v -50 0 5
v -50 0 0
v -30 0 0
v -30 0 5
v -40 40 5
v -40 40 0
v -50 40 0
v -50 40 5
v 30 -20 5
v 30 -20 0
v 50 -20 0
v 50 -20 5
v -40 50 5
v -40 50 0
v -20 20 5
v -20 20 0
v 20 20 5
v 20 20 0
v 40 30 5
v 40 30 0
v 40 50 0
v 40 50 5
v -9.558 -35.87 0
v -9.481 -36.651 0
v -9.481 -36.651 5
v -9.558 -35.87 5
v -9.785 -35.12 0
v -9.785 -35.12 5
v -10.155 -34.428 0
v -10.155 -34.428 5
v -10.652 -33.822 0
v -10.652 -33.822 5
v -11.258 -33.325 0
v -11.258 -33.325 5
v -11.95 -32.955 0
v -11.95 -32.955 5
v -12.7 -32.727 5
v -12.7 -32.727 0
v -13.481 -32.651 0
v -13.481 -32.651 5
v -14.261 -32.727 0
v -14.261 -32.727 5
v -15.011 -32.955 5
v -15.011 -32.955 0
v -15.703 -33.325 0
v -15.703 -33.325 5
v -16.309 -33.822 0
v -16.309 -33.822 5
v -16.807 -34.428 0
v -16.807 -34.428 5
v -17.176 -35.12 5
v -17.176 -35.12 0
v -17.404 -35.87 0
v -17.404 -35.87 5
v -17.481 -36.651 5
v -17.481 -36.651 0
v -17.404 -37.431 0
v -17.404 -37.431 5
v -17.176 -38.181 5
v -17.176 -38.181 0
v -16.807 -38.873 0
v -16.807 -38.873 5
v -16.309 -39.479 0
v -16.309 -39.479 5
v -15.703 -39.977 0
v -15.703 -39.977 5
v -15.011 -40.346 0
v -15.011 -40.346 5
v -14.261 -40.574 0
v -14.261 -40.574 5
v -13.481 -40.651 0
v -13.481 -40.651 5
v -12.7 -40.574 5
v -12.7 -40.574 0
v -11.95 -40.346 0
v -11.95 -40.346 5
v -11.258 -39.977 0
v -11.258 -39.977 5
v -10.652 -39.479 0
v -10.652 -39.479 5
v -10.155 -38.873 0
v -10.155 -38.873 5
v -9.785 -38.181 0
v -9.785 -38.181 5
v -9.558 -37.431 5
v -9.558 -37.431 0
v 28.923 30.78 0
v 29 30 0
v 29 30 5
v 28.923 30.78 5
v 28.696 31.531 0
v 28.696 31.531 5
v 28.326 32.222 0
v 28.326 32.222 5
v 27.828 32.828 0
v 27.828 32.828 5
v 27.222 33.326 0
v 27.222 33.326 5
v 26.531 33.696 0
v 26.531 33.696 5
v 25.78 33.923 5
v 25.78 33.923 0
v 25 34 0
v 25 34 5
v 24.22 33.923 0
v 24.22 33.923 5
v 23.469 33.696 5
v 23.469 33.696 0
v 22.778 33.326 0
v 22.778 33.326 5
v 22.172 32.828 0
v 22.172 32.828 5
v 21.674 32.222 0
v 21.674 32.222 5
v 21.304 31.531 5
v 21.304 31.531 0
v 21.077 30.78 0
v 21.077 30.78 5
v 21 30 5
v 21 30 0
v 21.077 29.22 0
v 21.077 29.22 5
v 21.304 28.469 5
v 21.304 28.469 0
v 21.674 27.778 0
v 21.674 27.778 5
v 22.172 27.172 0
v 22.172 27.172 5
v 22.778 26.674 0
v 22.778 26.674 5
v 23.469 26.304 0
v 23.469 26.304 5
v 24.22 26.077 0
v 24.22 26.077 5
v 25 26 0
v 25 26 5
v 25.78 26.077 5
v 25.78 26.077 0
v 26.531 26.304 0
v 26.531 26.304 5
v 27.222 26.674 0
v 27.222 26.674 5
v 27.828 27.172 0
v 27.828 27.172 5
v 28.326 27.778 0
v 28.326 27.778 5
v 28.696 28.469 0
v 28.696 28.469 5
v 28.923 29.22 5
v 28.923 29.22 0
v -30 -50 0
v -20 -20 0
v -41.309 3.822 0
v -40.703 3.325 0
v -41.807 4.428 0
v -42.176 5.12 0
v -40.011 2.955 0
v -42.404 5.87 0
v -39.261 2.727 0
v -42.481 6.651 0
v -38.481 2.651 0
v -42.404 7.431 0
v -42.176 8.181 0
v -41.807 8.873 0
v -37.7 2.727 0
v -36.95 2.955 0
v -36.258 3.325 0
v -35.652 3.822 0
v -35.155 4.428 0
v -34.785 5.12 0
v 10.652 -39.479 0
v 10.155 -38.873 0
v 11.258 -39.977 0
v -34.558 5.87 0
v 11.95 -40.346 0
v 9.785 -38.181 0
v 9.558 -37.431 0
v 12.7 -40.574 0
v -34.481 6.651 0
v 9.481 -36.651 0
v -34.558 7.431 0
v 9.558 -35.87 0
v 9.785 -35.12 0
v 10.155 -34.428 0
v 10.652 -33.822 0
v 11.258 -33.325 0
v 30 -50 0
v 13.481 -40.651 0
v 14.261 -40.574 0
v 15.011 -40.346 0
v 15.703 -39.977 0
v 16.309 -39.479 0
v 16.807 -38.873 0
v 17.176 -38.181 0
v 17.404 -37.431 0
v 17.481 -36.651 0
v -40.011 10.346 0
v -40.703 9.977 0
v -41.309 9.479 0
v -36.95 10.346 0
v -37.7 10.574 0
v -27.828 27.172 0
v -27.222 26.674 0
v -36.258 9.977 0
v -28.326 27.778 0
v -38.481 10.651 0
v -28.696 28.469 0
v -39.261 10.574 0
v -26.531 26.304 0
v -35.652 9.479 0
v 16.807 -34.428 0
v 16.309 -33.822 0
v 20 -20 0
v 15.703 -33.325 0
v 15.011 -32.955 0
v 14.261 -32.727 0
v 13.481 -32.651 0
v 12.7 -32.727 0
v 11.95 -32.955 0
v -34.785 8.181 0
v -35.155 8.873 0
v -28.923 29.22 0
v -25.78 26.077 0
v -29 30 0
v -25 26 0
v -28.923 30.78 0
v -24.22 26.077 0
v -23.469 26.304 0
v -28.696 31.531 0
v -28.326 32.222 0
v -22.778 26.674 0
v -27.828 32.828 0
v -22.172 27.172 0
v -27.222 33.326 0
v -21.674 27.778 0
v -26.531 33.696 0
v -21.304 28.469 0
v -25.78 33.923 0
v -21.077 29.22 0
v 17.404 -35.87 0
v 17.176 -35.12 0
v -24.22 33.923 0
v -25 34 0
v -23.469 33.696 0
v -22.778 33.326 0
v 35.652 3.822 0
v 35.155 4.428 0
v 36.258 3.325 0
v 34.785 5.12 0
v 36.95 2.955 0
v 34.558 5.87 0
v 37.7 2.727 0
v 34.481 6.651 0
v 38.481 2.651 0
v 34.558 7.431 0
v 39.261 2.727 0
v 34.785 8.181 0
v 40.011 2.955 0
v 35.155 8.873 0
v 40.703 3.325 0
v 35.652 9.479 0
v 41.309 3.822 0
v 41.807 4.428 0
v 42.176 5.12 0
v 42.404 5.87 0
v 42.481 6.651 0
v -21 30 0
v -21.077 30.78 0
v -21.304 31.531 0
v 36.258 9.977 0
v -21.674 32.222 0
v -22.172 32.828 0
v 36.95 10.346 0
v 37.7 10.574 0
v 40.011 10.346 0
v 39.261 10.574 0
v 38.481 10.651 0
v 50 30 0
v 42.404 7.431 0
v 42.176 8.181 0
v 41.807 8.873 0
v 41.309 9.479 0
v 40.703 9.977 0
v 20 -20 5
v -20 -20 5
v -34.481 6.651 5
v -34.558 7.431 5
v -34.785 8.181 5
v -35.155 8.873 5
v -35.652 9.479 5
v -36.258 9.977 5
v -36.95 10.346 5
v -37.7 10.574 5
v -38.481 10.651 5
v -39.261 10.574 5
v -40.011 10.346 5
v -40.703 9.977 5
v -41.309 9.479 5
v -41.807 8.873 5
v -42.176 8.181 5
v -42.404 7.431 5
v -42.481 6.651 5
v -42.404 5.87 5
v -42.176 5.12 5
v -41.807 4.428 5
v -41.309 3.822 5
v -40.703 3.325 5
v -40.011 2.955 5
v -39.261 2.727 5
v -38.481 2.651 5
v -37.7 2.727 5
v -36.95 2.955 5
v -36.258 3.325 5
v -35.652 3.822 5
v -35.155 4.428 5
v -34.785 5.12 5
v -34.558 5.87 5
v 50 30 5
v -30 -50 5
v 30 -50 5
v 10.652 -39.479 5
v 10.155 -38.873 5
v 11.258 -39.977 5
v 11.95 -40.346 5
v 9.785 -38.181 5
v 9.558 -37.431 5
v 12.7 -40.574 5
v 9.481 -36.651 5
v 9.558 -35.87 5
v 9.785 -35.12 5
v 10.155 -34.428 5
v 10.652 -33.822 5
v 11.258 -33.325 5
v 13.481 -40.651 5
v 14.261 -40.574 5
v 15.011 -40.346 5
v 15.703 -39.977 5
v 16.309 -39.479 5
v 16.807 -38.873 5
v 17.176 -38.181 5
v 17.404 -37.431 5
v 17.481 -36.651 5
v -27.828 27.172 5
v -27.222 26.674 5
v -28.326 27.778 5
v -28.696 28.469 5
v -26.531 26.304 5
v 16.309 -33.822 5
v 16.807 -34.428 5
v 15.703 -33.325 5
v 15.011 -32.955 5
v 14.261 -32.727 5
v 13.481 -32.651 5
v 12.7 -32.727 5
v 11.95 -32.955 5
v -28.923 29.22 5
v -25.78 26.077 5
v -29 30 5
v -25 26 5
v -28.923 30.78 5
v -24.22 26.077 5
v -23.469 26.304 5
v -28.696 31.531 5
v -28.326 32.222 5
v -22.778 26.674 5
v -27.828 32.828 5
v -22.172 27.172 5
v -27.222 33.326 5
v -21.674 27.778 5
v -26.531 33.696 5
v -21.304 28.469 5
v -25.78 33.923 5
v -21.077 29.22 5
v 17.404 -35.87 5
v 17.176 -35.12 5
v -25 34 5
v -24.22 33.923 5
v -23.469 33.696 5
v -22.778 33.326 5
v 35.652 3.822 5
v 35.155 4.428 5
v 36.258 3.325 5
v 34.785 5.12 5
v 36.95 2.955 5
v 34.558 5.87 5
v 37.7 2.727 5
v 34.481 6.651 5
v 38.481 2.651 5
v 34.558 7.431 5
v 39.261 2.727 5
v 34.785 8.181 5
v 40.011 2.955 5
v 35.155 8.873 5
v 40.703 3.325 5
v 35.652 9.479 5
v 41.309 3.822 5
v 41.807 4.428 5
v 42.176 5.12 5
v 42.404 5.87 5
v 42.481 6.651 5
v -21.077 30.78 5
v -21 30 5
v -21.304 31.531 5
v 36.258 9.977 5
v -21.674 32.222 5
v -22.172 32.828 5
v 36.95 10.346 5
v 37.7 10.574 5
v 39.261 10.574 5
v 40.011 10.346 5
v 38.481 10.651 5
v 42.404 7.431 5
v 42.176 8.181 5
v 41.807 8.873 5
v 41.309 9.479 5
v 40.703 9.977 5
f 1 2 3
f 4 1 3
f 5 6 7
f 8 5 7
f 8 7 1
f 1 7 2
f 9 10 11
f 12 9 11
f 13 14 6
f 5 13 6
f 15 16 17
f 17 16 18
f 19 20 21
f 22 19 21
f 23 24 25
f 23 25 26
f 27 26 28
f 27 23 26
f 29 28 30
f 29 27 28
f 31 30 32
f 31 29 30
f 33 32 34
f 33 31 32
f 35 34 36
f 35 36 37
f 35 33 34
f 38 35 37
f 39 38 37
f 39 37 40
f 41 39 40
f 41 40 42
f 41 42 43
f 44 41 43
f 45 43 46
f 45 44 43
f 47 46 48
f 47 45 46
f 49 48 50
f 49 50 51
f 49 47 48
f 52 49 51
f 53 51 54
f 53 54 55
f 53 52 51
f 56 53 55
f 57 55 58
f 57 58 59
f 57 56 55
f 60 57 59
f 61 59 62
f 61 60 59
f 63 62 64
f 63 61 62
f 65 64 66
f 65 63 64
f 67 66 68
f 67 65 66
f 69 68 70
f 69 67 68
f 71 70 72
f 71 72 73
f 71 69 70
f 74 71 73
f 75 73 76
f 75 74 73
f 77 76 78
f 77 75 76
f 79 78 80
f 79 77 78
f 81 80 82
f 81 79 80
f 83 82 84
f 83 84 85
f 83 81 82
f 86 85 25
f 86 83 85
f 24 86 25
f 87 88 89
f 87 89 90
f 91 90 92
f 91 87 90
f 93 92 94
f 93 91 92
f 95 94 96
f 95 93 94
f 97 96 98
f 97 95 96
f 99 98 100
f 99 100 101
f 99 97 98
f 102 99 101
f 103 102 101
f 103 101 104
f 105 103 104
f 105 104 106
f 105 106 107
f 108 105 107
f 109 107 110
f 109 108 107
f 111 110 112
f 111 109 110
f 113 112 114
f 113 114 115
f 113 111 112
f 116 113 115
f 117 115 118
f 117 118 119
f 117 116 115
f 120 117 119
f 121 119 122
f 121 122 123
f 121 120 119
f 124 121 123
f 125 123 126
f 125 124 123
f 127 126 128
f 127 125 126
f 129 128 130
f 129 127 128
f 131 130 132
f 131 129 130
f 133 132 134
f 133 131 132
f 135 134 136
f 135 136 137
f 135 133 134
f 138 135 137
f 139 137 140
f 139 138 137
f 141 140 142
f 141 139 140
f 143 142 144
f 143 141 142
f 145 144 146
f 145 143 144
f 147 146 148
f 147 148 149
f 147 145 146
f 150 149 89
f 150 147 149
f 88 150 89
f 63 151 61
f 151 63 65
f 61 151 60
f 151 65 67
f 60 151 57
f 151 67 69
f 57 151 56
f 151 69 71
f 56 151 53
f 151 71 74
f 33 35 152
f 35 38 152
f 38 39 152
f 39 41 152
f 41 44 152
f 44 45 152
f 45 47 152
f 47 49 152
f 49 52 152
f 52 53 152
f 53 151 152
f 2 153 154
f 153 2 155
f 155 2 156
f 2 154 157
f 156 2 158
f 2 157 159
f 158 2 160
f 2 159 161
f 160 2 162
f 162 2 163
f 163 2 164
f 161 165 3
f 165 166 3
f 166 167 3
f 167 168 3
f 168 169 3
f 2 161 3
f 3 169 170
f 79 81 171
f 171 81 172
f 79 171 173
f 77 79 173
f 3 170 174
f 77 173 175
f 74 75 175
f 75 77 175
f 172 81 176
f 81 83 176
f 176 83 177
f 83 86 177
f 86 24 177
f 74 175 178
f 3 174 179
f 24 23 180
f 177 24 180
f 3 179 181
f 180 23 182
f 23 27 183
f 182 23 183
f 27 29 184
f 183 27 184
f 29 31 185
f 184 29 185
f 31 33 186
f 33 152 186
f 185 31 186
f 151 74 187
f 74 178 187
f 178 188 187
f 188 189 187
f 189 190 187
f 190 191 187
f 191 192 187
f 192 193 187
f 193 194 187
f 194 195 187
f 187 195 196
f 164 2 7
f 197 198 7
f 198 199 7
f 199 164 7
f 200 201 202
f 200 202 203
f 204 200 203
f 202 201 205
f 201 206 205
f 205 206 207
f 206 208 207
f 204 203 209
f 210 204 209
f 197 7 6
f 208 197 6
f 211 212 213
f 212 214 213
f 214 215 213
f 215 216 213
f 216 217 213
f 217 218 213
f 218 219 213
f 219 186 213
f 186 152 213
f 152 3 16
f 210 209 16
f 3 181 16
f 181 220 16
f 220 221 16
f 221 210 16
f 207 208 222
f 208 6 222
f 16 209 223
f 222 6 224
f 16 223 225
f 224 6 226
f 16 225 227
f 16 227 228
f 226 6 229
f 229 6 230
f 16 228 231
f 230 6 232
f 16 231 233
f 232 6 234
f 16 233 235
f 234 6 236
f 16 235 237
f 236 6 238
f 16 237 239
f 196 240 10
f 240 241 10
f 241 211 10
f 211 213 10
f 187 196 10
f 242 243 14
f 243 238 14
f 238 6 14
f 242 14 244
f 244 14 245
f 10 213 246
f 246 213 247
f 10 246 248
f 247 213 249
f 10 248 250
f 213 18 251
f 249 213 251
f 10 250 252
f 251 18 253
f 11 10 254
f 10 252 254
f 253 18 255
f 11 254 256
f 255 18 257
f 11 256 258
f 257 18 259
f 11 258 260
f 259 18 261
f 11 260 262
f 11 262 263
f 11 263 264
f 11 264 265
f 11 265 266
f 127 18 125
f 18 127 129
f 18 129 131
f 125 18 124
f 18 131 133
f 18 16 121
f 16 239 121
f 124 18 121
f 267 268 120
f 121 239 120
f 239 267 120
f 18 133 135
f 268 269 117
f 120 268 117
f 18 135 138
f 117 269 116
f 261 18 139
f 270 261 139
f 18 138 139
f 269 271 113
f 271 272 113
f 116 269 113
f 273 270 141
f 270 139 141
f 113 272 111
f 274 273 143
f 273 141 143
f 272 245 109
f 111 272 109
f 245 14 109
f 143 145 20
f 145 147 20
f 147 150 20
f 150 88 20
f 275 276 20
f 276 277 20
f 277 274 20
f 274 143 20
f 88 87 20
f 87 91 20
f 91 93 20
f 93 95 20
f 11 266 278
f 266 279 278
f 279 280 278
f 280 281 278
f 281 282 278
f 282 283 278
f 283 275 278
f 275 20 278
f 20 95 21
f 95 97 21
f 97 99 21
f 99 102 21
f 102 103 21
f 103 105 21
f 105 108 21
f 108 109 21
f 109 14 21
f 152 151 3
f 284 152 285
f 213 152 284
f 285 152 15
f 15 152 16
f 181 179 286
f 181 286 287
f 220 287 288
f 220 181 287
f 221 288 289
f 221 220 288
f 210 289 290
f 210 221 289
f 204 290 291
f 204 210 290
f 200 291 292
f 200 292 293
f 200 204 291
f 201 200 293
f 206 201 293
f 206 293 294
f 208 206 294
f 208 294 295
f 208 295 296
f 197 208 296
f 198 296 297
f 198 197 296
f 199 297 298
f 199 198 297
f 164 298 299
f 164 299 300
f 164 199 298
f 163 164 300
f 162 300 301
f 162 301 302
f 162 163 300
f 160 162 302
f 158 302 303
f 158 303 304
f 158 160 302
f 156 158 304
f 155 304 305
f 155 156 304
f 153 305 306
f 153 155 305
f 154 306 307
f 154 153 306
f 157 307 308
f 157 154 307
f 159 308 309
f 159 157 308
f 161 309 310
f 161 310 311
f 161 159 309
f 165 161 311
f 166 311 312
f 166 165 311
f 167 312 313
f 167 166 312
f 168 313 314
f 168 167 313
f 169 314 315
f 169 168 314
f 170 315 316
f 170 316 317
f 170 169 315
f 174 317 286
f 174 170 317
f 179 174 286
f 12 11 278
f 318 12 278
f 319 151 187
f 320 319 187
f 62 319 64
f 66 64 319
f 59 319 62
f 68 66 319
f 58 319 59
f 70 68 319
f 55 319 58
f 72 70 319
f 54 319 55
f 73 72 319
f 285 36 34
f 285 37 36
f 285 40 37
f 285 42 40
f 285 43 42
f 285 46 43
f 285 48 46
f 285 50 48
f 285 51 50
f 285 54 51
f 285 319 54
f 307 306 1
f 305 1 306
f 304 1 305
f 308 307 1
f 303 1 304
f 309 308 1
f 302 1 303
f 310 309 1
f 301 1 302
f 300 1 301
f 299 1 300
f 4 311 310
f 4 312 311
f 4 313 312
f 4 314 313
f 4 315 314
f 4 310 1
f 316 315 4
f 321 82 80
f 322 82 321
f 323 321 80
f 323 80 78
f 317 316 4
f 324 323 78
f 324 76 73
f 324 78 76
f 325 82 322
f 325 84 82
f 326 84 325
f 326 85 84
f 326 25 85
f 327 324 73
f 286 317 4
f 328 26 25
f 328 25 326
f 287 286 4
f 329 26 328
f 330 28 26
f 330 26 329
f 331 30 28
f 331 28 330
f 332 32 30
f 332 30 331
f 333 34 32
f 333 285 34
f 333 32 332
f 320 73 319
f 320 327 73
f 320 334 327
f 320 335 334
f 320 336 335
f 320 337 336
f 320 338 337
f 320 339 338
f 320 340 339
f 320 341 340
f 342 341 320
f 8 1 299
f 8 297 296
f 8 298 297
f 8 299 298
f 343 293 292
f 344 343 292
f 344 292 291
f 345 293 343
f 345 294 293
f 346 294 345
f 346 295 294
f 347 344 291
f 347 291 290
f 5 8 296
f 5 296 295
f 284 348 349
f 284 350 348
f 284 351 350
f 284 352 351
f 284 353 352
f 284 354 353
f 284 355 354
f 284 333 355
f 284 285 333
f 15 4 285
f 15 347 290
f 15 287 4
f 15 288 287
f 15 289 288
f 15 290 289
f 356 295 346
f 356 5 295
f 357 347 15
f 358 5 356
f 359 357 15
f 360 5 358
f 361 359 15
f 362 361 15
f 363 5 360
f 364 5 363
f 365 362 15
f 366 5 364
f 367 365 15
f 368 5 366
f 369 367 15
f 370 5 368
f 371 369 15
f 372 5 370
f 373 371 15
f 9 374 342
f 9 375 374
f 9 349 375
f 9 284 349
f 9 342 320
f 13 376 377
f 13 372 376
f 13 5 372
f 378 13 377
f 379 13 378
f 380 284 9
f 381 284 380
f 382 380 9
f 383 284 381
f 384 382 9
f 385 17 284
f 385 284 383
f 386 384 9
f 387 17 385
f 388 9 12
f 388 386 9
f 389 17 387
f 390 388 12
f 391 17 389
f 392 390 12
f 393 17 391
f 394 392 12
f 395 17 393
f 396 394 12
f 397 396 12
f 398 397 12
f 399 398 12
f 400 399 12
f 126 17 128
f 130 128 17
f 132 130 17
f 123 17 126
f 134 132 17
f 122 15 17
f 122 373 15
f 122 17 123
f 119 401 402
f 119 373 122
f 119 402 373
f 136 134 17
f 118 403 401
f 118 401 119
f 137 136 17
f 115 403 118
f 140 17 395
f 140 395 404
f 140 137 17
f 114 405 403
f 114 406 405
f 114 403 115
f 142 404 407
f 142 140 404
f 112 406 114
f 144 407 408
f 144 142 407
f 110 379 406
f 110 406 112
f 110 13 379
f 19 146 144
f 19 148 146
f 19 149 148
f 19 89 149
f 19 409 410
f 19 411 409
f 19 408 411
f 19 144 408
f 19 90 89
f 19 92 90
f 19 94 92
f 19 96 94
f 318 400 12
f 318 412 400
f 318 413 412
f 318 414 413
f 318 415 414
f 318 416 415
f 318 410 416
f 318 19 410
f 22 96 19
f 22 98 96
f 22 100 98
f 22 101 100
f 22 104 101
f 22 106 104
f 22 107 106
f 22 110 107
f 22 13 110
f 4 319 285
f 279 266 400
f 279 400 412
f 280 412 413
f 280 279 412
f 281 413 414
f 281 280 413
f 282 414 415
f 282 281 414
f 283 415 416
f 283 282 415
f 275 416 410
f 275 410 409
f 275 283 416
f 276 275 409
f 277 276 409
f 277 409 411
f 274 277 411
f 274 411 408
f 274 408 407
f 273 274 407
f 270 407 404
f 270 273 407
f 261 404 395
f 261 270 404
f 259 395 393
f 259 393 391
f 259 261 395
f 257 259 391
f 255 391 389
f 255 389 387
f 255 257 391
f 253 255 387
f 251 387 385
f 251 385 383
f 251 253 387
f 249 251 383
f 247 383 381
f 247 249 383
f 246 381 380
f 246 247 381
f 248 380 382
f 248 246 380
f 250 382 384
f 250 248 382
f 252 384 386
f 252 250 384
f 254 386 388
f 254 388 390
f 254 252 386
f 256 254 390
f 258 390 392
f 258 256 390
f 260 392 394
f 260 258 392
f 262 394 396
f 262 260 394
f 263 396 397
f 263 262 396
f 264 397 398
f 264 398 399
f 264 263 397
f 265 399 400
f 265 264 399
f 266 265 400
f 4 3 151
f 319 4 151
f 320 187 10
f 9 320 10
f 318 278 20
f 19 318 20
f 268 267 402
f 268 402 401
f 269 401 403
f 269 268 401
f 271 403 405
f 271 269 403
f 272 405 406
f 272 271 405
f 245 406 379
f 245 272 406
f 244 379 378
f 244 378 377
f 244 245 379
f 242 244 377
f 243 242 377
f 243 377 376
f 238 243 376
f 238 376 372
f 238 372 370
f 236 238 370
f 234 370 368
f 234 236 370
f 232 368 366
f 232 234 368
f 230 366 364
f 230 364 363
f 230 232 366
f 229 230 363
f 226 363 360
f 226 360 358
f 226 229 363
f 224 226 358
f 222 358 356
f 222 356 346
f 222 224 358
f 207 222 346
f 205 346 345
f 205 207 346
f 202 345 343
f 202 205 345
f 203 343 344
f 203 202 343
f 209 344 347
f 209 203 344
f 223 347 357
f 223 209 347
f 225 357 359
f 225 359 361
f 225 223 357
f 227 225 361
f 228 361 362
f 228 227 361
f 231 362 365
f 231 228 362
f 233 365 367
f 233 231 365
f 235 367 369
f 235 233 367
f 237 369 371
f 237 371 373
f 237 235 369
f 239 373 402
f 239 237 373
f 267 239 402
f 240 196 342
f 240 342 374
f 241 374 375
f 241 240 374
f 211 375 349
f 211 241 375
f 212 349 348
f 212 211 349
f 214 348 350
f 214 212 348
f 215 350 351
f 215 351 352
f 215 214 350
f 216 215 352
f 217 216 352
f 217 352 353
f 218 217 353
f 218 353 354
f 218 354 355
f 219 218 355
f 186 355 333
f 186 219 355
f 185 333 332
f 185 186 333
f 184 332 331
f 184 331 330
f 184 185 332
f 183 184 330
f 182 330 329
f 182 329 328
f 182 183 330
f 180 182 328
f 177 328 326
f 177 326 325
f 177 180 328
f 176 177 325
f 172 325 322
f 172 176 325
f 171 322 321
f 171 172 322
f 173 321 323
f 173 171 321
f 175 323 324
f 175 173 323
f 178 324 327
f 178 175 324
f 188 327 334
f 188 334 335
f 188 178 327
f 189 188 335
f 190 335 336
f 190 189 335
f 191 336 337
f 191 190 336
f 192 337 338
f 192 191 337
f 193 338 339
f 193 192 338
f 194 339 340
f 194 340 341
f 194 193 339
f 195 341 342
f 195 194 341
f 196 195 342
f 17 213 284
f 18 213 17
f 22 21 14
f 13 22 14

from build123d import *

# Parameters (mm, degrees)
F0_R     = 4
F0_W     = 40
F0_H     = 40
F1_DEPTH = 5


with BuildPart() as f1:
    # F0 (on Top) → F1 (new body)
    with BuildSketch(Plane.XY):
        Polygon((40, 50), (-40, 50), (-40, 40), (-50, 40), (-50, 0), (-30, 0), (-30, -50), (30, -50), (30, -20), (50, -20), (50, 30), (40, 30), align=None)
        with Locations((-13.480762, -36.650635)):
            Circle(F0_R, mode=Mode.SUBTRACT)
        with Locations((13.480762, -36.650635)):
            Circle(F0_R, mode=Mode.SUBTRACT)
        with Locations((-38.480762, 6.650635)):
            Circle(F0_R, mode=Mode.SUBTRACT)
        with Locations((-25, 30)):
            Circle(F0_R, mode=Mode.SUBTRACT)
        Rectangle(F0_W, F0_H, mode=Mode.SUBTRACT)
        with Locations((38.480762, 6.650635)):
            Circle(F0_R, mode=Mode.SUBTRACT)
        with Locations((25, 30)):
            Circle(F0_R, mode=Mode.SUBTRACT)
    extrude(amount=F1_DEPTH)


solid = f1.part
